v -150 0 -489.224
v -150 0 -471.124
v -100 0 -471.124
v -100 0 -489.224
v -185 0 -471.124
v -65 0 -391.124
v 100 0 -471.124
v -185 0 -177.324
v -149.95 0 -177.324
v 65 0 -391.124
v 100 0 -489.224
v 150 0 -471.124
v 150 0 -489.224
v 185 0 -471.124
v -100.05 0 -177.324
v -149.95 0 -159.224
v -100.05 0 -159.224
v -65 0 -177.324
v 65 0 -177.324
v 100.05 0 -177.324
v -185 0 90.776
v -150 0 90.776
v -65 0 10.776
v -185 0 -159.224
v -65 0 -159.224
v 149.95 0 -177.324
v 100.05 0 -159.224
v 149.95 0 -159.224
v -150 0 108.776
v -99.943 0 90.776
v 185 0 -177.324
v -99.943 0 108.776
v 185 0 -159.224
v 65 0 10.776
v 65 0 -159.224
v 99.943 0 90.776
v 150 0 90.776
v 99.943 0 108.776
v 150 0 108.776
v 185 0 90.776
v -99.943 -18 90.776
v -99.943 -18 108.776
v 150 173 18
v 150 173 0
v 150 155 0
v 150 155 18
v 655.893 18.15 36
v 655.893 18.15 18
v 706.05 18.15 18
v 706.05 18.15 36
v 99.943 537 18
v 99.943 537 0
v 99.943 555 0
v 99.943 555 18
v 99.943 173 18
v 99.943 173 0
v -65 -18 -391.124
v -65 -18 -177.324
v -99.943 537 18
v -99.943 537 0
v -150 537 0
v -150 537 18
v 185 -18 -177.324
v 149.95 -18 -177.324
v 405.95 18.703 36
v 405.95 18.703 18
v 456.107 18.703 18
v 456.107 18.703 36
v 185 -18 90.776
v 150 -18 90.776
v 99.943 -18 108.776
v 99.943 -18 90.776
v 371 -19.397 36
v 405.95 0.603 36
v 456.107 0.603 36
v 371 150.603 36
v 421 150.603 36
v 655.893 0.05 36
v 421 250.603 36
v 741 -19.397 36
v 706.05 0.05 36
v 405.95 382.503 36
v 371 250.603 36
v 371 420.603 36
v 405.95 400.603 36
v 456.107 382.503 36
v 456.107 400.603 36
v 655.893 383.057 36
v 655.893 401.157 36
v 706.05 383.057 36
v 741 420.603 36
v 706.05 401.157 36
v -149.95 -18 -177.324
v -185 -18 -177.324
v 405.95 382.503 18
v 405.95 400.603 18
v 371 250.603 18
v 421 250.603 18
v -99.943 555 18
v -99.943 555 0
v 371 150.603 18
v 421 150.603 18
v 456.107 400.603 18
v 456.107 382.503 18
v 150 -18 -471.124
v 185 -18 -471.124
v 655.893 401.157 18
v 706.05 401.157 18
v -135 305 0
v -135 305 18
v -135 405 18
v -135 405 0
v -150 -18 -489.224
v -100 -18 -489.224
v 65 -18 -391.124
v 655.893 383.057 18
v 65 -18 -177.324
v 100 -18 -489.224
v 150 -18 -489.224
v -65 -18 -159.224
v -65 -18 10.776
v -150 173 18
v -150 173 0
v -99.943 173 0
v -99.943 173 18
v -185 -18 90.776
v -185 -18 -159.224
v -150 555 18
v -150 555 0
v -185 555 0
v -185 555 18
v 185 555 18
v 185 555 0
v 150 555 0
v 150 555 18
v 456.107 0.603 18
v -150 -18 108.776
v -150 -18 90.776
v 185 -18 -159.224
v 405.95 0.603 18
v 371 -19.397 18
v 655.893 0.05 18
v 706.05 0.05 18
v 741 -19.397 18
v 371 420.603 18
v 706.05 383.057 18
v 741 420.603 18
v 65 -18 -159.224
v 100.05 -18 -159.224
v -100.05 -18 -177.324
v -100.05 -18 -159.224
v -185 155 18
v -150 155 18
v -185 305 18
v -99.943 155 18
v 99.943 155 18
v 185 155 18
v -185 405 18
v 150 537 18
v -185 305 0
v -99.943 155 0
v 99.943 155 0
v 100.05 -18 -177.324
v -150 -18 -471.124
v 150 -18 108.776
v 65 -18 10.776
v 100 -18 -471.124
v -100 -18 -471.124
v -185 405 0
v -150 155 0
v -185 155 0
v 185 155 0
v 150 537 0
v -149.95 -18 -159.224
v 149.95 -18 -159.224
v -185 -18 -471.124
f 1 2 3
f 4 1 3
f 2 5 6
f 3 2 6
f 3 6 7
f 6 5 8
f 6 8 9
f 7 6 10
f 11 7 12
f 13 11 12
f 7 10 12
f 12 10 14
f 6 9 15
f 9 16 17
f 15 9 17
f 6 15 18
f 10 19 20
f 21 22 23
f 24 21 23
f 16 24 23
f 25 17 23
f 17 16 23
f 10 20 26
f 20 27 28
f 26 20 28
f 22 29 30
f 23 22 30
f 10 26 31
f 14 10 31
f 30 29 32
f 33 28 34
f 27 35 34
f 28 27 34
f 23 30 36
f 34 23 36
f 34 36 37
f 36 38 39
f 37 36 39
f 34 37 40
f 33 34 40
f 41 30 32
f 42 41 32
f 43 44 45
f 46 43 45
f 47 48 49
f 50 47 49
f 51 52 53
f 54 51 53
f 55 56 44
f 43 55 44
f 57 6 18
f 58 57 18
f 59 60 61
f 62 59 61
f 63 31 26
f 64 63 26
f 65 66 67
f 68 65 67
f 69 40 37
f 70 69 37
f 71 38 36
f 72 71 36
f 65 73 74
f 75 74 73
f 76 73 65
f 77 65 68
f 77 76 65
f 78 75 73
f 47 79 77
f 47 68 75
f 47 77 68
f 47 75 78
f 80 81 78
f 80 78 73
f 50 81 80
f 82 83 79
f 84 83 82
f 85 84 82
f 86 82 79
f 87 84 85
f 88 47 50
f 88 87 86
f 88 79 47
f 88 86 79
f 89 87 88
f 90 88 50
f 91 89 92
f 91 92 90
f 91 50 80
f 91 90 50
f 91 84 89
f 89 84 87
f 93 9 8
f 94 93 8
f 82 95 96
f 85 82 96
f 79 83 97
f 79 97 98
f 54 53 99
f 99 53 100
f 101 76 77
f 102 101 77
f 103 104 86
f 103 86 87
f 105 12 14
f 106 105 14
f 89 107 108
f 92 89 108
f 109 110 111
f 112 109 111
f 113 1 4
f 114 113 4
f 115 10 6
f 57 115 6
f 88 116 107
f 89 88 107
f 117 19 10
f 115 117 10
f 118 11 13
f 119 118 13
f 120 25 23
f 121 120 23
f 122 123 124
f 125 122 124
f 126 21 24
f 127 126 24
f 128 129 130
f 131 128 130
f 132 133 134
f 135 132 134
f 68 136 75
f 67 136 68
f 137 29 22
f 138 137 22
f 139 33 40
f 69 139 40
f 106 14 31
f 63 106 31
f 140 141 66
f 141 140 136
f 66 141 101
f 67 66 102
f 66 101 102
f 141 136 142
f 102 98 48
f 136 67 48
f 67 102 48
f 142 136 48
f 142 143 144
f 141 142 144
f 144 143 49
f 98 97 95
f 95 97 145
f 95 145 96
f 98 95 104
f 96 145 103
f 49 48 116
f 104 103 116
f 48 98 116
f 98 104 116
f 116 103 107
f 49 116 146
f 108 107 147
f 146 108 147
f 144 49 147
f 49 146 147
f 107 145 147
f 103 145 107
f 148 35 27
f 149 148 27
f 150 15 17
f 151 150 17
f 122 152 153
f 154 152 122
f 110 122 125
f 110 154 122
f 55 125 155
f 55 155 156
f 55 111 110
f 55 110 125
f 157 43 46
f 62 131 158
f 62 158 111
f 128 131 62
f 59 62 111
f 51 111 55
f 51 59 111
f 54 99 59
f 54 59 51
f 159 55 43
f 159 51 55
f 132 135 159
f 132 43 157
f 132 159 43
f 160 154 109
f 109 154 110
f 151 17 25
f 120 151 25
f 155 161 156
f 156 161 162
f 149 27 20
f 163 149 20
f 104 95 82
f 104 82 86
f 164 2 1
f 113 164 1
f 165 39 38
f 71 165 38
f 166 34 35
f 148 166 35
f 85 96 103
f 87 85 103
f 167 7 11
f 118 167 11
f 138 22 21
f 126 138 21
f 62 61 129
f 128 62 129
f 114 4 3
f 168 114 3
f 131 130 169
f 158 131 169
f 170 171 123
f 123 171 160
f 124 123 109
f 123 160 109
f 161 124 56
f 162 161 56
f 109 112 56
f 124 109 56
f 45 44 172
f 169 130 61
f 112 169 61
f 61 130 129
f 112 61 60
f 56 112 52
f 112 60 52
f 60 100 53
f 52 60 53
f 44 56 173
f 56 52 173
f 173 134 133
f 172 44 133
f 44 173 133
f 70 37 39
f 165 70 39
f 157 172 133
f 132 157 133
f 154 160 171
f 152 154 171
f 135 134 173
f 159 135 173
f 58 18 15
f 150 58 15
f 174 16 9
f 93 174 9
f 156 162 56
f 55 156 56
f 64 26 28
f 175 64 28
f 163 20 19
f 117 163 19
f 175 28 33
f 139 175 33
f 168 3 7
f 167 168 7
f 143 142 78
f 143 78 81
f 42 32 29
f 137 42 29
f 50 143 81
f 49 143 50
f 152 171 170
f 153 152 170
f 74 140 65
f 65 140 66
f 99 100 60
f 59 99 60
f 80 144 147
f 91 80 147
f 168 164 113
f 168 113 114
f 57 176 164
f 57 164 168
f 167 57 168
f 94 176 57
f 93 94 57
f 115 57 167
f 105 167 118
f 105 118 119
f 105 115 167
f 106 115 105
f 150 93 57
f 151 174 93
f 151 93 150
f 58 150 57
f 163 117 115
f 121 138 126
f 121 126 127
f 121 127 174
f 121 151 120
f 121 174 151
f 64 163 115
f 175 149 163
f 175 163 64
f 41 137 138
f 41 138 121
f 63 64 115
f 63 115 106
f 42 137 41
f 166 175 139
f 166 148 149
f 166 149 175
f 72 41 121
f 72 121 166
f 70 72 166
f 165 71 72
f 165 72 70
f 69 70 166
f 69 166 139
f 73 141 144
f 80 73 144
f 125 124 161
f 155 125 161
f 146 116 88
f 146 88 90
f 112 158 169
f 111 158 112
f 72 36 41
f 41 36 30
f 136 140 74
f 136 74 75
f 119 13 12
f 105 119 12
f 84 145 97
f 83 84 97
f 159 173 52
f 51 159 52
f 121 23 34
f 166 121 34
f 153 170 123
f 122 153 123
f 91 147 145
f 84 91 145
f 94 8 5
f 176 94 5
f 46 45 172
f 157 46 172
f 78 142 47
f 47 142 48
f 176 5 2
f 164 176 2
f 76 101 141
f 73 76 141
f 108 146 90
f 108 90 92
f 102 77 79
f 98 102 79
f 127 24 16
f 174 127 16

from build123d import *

# Parameters (mm, degrees)
F2_DEPTH = 18
F3_DEPTH = 18
F5_W     = 50.15719
F5_H     = 18.1
F6_DEPTH = 18
F8_W     = 50
F8_H     = 100
F9_DEPTH = 45


with BuildPart() as f2:
    # F1 (on Top) → F2 (new body)
    with BuildSketch(Plane.XY):
        Polygon((-185, 0), (-150, 0), (-150, 18), (-99.94281, 18), (-99.94281, 0), (99.94281, 0), (99.94281, 18), (150, 18), (150, 0), (185, 0), (185, 200), (185, 400), (150, 400), (150, 382), (99.94281, 382), (99.94281, 400), (-99.94281, 400), (-99.94281, 382), (-150, 382), (-150, 400), (-185, 400), (-185, 200), align=None)
    extrude(amount=F2_DEPTH)


with BuildPart() as f3:
    # F0 (on Front) → F3 (new body)
    with BuildSketch(Plane.XZ):
        Polygon((-150, -471.124116), (-150, -489.224116), (-125, -489.224116), (-100, -489.224116), (-100, -471.124116), (-65, -471.124116), (0, -471.124116), (65, -471.124116), (100, -471.124116), (100, -489.224116), (125, -489.224116), (150, -489.224116), (150, -471.124116), (185, -471.124116), (185, -177.324116), (150, -177.324116), (149.95, -177.324116), (149.95, -159.224116), (150, -159.224116), (185, -159.224116), (185, 90.775884), (150, 90.775884), (150, 108.775884), (99.94281, 108.775884), (99.94281, 90.775884), (65, 90.775884), (0, 90.775884), (-65, 90.775884), (-99.94281, 90.775884), (-99.94281, 108.775884), (-150, 108.775884), (-150, 90.775884), (-185, 90.775884), (-185, -159.224116), (-150, -159.224116), (-149.95, -159.224116), (-149.95, -177.324116), (-150, -177.324116), (-185, -177.324116), (-185, -471.124116), align=None)
        Polygon((-100, -159.224116), (-65, -159.224116), (-65, 10.775884), (0, 10.775884), (65, 10.775884), (65, -159.224116), (100, -159.224116), (100.05, -159.224116), (100.05, -177.324116), (100, -177.324116), (65, -177.324116), (65, -391.124116), (0, -391.124116), (-65, -391.124116), (-65, -177.324116), (-100, -177.324116), (-100.05, -177.324116), (-100.05, -159.224116), align=None, mode=Mode.SUBTRACT)
    extrude(amount=F3_DEPTH)


with BuildPart() as f2_1:
    # F4: moved
    add(f2.part.moved(Location((0, 155, 0))))


with BuildPart() as f6:
    # F5 (on face) → F6 (new body)
    with BuildSketch(Plane.XY.offset(18)):
        Polygon((150, 155), (185, 155), (185, 200.603484), (185, 246.206968), (185, 420.603484), (-185, 420.603484), (-185, 200.603484), (-185, 155), (-150, 155), (-150, 173), (-99.94281, 173), (-99.94281, 155), (99.94281, 155), (99.94281, 173), (150, 173), align=None)
        with Locations((-124.971405, 391.553484)):
            Rectangle(F5_W, F5_H, mode=Mode.SUBTRACT)
        with Locations((124.971405, 392.106968)):
            Rectangle(F5_W, F5_H, mode=Mode.SUBTRACT)
        Polygon((185, -19.396516), (185, 155), (150, 155), (150, 173), (99.94281, 173), (99.94281, 155), (-99.94281, 155), (-99.94281, 173), (-150, 173), (-150, 155), (-185, 155), (-185, -19.396516), align=None)
        with Locations((-124.971405, 9.653484)):
            Rectangle(F5_W, F5_H, mode=Mode.SUBTRACT)
        with Locations((124.971405, 9.1)):
            Rectangle(F5_W, F5_H, mode=Mode.SUBTRACT)
    extrude(amount=F6_DEPTH)


with BuildPart() as f6_1:
    # F7: moved
    add(f6.part.moved(Location((556, 0, 0))))


with BuildPart() as f9_tool:
    # F8 (on face) → F9 (new body)
    with BuildSketch(Plane.XY.offset(36)):
        with Locations((-160, 355)):
            Rectangle(F8_W, F8_H)
        with Locations((396, 200.603484)):
            Rectangle(F8_W, F8_H)
    extrude(amount=-F9_DEPTH)


with BuildPart() as f2_2:
    add(f2_1.part)

    # F9: cut by f9_tool
    add(f9_tool.part, mode=Mode.SUBTRACT)


with BuildPart() as f6_2:
    add(f6_1.part)

    # F9: cut by f9_tool
    add(f9_tool.part, mode=Mode.SUBTRACT)


solid = Compound([f3.part, f2_2.part, f6_2.part])
